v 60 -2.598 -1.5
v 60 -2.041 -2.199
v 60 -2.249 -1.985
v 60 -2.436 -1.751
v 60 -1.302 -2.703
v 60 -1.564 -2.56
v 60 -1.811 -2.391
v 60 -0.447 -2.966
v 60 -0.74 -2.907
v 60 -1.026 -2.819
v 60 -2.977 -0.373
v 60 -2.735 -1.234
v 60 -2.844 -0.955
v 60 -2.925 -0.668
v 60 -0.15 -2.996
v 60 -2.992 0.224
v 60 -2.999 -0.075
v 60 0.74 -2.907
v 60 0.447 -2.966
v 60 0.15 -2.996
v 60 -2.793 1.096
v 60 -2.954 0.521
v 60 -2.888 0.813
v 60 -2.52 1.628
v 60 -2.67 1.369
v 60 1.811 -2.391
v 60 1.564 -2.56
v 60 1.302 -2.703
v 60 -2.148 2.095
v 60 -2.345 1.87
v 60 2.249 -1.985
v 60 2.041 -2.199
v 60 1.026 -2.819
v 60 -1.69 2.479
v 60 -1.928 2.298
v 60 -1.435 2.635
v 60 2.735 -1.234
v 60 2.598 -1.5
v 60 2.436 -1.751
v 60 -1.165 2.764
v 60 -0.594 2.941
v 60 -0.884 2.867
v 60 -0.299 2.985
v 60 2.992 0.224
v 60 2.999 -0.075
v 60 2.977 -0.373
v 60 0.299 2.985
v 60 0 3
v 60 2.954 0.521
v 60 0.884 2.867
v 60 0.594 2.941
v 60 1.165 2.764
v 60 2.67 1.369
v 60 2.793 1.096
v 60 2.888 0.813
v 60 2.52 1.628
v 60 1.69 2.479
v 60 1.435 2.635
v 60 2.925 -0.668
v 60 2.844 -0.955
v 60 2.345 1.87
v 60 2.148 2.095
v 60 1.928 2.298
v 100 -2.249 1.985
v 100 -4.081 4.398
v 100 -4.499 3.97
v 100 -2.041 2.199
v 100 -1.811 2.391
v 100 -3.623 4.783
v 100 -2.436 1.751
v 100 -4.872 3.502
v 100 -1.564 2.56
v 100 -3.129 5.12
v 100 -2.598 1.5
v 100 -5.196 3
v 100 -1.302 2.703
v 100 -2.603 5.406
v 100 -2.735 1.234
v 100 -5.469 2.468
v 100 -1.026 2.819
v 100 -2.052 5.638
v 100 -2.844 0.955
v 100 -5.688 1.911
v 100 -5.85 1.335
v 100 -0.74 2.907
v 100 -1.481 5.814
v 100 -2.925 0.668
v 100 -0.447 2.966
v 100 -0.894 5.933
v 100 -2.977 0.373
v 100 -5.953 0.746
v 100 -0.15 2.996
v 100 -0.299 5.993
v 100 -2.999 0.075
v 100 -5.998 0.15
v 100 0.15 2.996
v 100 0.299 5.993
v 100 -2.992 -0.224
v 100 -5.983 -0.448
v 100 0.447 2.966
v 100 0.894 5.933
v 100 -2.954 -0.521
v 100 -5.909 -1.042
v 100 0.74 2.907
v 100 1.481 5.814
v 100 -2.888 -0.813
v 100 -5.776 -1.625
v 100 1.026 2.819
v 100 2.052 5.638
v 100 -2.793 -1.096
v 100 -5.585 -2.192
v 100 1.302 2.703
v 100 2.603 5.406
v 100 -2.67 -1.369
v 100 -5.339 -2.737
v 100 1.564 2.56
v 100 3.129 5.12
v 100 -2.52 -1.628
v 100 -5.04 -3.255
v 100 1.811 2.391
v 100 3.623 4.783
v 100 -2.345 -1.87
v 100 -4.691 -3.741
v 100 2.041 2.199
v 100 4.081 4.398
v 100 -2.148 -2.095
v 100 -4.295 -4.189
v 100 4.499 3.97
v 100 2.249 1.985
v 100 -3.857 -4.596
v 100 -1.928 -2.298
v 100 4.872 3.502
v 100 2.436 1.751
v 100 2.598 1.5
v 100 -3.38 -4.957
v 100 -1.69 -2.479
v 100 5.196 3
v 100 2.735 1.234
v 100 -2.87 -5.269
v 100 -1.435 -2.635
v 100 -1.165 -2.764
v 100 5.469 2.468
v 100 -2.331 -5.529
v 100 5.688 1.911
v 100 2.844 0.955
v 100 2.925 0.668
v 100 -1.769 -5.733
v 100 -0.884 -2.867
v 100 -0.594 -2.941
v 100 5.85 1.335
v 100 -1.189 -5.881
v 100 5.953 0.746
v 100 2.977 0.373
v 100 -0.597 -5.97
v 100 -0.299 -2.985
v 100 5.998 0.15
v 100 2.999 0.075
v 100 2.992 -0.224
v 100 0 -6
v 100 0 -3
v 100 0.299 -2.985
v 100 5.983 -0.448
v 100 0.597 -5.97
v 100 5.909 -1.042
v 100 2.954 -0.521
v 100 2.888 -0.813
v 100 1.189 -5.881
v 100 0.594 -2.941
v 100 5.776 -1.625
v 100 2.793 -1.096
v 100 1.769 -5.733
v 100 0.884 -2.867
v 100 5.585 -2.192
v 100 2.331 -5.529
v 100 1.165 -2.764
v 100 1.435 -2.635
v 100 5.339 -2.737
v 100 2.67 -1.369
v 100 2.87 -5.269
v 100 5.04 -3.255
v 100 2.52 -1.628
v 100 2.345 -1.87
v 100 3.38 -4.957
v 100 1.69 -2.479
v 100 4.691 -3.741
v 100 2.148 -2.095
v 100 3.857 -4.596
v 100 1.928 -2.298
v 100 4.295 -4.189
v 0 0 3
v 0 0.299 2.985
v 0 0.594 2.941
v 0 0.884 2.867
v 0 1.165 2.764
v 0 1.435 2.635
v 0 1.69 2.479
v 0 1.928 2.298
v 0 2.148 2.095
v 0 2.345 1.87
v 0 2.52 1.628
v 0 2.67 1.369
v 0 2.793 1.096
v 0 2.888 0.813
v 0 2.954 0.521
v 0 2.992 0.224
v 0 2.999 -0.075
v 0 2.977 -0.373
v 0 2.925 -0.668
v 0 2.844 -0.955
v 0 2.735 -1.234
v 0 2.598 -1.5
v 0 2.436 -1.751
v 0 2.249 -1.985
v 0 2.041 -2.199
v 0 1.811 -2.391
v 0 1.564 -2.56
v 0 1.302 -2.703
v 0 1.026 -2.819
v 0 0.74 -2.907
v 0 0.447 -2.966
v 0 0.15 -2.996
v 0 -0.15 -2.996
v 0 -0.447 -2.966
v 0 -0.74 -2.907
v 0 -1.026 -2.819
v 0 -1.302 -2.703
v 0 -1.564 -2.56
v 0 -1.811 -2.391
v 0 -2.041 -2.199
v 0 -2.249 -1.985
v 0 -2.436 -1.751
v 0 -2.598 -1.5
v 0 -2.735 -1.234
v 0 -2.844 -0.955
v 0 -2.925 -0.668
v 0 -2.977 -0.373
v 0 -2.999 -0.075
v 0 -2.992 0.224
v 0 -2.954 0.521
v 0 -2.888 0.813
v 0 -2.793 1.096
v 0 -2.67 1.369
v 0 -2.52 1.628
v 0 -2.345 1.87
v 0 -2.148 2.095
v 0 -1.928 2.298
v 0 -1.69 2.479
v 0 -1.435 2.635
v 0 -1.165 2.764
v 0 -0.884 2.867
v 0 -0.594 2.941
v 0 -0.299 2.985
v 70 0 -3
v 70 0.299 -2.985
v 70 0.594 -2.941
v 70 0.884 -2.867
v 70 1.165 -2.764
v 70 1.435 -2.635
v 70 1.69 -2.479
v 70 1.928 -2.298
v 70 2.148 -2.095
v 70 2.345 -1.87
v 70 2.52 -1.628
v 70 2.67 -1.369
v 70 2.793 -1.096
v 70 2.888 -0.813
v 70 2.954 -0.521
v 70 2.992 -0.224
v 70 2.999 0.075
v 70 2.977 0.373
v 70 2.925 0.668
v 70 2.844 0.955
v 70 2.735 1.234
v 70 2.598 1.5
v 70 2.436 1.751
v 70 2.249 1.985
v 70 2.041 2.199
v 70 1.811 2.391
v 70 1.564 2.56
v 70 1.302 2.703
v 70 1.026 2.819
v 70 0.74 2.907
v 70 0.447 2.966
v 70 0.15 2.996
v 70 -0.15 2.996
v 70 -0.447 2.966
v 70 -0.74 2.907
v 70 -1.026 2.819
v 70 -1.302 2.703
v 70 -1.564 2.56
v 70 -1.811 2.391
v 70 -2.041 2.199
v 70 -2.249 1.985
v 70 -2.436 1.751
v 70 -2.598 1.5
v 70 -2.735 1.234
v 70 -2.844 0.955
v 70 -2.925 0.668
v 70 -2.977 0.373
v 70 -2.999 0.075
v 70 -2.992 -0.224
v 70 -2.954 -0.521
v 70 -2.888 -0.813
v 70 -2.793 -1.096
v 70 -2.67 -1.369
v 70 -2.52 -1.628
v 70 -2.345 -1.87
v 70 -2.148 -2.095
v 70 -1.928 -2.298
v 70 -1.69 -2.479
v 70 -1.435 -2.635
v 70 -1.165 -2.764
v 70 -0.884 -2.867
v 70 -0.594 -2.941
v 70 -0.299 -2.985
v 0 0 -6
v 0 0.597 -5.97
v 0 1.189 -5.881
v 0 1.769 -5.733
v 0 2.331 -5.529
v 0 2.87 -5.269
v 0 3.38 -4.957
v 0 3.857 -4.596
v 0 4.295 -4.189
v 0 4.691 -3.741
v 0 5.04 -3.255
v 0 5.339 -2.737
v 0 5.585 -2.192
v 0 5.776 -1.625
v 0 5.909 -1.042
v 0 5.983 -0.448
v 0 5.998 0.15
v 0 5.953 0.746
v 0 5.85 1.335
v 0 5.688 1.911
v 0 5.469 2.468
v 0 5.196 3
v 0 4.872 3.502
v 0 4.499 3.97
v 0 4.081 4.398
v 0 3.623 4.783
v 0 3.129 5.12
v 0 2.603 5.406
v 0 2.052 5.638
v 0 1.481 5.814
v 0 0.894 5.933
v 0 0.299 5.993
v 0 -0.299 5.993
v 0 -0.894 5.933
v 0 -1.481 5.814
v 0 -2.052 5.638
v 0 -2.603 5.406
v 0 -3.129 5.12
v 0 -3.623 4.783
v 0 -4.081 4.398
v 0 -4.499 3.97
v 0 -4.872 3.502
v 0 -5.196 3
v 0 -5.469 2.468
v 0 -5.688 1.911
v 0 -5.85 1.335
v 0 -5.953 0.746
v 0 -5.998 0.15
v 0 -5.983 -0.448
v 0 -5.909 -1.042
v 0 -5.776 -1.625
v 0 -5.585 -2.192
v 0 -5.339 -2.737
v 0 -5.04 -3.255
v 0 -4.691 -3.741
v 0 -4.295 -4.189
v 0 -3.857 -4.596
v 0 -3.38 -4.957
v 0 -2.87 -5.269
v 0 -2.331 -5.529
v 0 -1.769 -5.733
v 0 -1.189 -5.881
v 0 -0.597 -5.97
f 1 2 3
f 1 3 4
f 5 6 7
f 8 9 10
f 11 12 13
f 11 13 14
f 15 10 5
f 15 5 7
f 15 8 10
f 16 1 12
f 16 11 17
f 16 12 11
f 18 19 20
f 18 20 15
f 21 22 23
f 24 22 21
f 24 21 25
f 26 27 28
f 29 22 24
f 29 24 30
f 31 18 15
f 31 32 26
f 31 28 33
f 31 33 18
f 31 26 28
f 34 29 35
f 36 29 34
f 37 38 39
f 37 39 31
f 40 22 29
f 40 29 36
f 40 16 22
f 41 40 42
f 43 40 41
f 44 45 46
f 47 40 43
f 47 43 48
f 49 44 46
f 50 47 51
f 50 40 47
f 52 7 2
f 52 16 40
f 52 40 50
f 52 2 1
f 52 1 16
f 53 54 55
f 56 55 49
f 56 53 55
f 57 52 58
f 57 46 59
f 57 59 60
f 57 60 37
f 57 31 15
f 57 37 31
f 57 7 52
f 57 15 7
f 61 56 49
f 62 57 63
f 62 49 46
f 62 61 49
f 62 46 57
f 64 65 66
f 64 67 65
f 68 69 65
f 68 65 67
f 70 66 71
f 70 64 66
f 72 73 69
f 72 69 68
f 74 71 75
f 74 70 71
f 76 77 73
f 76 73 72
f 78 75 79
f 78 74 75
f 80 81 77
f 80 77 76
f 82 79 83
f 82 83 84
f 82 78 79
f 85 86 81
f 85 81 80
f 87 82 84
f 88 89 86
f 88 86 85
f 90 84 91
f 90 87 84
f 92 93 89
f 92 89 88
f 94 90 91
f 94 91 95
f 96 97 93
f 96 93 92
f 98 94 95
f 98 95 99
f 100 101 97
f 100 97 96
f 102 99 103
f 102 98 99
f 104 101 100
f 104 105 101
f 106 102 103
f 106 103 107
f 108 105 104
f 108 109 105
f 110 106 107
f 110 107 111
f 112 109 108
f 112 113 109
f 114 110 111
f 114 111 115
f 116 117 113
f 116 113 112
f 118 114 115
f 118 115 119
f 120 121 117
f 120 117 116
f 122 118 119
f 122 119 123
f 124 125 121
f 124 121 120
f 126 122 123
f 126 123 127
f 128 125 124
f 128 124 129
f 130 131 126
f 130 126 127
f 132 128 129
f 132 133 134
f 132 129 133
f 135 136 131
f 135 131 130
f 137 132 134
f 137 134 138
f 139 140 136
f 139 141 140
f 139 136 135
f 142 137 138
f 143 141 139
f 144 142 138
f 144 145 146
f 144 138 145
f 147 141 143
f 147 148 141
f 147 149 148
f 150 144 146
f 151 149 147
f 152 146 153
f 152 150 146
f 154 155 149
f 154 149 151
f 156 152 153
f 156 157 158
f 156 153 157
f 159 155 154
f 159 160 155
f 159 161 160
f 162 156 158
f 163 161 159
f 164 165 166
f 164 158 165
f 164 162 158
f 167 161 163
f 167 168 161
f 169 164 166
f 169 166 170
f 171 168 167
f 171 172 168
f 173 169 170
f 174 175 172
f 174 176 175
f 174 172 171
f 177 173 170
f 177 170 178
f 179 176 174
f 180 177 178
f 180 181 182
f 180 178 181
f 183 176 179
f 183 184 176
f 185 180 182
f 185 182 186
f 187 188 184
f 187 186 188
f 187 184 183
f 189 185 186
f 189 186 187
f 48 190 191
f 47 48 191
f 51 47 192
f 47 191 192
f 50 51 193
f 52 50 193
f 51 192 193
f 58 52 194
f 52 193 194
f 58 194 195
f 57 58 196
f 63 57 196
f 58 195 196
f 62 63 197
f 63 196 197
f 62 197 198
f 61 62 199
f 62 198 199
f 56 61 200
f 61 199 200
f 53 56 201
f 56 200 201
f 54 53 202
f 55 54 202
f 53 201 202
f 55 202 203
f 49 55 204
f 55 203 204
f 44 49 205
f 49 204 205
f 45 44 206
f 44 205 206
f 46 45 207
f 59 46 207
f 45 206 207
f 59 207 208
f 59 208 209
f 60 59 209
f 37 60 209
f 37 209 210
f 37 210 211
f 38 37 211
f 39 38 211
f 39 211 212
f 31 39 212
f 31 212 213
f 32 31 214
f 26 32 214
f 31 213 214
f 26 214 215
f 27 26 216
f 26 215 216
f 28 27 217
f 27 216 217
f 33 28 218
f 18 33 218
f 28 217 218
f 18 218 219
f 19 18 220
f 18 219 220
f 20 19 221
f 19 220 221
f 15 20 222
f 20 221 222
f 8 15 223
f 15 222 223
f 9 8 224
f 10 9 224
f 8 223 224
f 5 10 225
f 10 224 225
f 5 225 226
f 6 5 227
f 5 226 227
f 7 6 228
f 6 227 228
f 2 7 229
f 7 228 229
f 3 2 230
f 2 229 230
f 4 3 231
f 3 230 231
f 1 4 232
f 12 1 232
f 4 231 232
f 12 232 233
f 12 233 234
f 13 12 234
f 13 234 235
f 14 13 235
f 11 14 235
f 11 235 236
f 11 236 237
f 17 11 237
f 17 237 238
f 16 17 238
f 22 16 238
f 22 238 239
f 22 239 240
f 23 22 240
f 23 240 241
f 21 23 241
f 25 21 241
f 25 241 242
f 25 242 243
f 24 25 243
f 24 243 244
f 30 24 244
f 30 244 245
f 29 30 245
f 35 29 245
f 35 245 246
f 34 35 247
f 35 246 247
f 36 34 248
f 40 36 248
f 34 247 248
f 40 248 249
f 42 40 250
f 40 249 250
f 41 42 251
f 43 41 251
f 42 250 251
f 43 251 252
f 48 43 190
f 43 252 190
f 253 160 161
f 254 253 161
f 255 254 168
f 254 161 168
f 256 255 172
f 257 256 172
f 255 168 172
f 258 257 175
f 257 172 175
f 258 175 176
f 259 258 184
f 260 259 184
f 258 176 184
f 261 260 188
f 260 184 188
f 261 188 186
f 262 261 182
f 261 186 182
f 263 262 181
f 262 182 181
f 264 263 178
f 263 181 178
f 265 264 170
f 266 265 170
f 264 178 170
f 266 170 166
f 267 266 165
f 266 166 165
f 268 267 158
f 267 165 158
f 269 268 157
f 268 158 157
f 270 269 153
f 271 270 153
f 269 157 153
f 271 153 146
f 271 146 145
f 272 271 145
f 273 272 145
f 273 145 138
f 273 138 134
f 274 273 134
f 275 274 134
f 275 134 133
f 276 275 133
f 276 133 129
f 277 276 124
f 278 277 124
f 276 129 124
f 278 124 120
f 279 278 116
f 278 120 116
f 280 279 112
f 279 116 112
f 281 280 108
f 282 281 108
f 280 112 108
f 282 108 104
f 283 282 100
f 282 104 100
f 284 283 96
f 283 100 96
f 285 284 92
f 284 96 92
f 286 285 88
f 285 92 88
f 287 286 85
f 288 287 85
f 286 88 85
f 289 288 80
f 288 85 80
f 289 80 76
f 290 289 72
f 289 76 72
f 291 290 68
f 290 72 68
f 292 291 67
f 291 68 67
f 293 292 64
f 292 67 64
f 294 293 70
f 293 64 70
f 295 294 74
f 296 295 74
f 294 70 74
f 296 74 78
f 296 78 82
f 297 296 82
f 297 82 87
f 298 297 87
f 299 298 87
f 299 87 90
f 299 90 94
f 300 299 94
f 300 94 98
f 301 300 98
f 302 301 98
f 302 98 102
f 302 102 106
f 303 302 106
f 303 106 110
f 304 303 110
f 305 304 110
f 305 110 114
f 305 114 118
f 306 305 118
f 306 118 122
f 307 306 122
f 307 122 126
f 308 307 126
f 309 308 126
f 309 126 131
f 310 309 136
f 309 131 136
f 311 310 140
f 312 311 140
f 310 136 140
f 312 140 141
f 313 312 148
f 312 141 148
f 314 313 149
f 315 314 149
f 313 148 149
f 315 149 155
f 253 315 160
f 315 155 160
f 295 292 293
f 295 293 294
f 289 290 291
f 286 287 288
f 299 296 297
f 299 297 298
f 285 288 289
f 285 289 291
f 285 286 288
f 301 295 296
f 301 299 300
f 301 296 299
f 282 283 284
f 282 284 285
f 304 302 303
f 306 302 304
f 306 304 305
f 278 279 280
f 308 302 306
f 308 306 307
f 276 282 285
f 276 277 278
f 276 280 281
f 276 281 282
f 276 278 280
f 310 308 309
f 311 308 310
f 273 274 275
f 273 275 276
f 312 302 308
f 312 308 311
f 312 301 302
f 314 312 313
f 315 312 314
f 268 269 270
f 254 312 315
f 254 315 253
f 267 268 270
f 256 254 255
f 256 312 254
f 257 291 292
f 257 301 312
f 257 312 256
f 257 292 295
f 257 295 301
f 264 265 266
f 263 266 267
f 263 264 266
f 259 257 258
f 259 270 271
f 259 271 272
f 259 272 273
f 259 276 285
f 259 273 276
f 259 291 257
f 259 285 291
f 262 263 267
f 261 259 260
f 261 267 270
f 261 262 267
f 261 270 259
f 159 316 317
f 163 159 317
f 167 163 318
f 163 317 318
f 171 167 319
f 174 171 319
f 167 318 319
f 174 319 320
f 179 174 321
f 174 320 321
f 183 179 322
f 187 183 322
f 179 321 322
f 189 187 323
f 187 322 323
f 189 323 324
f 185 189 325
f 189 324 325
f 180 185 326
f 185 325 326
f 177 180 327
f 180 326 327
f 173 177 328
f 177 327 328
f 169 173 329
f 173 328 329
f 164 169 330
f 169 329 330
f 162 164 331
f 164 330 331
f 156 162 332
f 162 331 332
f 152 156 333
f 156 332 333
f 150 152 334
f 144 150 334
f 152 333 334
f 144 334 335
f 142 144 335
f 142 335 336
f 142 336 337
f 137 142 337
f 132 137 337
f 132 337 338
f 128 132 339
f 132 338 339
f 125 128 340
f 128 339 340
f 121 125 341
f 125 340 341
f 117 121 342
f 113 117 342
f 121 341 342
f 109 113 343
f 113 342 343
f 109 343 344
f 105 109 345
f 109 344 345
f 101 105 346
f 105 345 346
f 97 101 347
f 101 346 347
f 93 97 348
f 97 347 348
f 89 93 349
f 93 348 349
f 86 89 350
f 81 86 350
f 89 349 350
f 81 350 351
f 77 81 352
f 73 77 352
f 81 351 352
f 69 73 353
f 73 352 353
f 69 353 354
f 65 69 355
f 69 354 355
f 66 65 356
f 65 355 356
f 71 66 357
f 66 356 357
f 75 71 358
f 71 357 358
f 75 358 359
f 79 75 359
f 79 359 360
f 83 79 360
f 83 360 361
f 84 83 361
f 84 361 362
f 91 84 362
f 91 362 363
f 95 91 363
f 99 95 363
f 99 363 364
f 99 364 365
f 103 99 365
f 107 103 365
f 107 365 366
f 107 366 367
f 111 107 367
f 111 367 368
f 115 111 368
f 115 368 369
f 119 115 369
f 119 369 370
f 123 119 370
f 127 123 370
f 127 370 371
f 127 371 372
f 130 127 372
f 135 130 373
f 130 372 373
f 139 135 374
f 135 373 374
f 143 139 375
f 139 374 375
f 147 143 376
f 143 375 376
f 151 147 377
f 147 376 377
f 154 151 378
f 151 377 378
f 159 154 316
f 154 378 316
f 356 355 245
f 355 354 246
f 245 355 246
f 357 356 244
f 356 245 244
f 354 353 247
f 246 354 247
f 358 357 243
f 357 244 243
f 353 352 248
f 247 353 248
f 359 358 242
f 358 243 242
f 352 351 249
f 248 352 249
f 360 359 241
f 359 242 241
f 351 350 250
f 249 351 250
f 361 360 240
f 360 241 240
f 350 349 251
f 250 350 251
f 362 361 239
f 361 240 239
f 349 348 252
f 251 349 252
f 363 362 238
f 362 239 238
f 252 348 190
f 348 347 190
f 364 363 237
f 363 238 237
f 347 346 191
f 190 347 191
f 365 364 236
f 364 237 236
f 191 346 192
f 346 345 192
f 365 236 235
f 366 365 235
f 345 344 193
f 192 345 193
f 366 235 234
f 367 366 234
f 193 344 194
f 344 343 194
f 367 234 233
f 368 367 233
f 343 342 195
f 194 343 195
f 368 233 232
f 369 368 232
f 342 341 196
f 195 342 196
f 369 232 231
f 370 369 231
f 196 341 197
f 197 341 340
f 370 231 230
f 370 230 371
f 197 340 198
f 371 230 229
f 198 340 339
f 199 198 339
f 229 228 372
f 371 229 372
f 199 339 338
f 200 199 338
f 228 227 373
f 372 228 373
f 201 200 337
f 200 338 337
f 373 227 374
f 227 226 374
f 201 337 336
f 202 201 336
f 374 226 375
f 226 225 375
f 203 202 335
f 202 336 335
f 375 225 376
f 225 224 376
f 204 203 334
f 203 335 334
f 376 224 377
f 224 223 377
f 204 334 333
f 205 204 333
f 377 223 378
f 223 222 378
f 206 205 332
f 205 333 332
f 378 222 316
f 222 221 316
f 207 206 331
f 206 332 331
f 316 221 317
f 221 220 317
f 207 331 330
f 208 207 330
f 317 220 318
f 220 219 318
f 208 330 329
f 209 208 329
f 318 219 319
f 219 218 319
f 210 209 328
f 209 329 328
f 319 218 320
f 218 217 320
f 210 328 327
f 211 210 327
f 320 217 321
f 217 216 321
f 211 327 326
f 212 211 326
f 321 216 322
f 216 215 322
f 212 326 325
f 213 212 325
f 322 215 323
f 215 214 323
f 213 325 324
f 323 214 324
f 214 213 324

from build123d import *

# Parameters (mm, degrees)
SKETCH1_R           = 6
BOSS_EXTRUDE1_DEPTH = 100
SKETCH2_R           = 3
CUT_EXTRUDE1_DEPTH  = 30
SKETCH3_R           = 3
CUT_EXTRUDE2_DEPTH  = 60


with BuildPart() as part:
    # Sketch1 → Boss-Extrude1 (new body)
    with BuildSketch(Plane(origin=(0, 0, 0), x_dir=(0, 0, -1), z_dir=(1, 0, 0))):
        Circle(SKETCH1_R)
    extrude(amount=BOSS_EXTRUDE1_DEPTH)

    # Sketch2 → Cut-Extrude1 (cut)
    with BuildSketch(Plane(origin=(100, 0, 0), x_dir=(0, 0, -1), z_dir=(1, 0, 0))):
        Circle(SKETCH2_R)
    extrude(amount=-CUT_EXTRUDE1_DEPTH, mode=Mode.SUBTRACT)

    # Sketch3 → Cut-Extrude2 (cut)
    with BuildSketch(Plane.ZY):
        Circle(SKETCH3_R)
    extrude(amount=-CUT_EXTRUDE2_DEPTH, mode=Mode.SUBTRACT)


solid = part.part
